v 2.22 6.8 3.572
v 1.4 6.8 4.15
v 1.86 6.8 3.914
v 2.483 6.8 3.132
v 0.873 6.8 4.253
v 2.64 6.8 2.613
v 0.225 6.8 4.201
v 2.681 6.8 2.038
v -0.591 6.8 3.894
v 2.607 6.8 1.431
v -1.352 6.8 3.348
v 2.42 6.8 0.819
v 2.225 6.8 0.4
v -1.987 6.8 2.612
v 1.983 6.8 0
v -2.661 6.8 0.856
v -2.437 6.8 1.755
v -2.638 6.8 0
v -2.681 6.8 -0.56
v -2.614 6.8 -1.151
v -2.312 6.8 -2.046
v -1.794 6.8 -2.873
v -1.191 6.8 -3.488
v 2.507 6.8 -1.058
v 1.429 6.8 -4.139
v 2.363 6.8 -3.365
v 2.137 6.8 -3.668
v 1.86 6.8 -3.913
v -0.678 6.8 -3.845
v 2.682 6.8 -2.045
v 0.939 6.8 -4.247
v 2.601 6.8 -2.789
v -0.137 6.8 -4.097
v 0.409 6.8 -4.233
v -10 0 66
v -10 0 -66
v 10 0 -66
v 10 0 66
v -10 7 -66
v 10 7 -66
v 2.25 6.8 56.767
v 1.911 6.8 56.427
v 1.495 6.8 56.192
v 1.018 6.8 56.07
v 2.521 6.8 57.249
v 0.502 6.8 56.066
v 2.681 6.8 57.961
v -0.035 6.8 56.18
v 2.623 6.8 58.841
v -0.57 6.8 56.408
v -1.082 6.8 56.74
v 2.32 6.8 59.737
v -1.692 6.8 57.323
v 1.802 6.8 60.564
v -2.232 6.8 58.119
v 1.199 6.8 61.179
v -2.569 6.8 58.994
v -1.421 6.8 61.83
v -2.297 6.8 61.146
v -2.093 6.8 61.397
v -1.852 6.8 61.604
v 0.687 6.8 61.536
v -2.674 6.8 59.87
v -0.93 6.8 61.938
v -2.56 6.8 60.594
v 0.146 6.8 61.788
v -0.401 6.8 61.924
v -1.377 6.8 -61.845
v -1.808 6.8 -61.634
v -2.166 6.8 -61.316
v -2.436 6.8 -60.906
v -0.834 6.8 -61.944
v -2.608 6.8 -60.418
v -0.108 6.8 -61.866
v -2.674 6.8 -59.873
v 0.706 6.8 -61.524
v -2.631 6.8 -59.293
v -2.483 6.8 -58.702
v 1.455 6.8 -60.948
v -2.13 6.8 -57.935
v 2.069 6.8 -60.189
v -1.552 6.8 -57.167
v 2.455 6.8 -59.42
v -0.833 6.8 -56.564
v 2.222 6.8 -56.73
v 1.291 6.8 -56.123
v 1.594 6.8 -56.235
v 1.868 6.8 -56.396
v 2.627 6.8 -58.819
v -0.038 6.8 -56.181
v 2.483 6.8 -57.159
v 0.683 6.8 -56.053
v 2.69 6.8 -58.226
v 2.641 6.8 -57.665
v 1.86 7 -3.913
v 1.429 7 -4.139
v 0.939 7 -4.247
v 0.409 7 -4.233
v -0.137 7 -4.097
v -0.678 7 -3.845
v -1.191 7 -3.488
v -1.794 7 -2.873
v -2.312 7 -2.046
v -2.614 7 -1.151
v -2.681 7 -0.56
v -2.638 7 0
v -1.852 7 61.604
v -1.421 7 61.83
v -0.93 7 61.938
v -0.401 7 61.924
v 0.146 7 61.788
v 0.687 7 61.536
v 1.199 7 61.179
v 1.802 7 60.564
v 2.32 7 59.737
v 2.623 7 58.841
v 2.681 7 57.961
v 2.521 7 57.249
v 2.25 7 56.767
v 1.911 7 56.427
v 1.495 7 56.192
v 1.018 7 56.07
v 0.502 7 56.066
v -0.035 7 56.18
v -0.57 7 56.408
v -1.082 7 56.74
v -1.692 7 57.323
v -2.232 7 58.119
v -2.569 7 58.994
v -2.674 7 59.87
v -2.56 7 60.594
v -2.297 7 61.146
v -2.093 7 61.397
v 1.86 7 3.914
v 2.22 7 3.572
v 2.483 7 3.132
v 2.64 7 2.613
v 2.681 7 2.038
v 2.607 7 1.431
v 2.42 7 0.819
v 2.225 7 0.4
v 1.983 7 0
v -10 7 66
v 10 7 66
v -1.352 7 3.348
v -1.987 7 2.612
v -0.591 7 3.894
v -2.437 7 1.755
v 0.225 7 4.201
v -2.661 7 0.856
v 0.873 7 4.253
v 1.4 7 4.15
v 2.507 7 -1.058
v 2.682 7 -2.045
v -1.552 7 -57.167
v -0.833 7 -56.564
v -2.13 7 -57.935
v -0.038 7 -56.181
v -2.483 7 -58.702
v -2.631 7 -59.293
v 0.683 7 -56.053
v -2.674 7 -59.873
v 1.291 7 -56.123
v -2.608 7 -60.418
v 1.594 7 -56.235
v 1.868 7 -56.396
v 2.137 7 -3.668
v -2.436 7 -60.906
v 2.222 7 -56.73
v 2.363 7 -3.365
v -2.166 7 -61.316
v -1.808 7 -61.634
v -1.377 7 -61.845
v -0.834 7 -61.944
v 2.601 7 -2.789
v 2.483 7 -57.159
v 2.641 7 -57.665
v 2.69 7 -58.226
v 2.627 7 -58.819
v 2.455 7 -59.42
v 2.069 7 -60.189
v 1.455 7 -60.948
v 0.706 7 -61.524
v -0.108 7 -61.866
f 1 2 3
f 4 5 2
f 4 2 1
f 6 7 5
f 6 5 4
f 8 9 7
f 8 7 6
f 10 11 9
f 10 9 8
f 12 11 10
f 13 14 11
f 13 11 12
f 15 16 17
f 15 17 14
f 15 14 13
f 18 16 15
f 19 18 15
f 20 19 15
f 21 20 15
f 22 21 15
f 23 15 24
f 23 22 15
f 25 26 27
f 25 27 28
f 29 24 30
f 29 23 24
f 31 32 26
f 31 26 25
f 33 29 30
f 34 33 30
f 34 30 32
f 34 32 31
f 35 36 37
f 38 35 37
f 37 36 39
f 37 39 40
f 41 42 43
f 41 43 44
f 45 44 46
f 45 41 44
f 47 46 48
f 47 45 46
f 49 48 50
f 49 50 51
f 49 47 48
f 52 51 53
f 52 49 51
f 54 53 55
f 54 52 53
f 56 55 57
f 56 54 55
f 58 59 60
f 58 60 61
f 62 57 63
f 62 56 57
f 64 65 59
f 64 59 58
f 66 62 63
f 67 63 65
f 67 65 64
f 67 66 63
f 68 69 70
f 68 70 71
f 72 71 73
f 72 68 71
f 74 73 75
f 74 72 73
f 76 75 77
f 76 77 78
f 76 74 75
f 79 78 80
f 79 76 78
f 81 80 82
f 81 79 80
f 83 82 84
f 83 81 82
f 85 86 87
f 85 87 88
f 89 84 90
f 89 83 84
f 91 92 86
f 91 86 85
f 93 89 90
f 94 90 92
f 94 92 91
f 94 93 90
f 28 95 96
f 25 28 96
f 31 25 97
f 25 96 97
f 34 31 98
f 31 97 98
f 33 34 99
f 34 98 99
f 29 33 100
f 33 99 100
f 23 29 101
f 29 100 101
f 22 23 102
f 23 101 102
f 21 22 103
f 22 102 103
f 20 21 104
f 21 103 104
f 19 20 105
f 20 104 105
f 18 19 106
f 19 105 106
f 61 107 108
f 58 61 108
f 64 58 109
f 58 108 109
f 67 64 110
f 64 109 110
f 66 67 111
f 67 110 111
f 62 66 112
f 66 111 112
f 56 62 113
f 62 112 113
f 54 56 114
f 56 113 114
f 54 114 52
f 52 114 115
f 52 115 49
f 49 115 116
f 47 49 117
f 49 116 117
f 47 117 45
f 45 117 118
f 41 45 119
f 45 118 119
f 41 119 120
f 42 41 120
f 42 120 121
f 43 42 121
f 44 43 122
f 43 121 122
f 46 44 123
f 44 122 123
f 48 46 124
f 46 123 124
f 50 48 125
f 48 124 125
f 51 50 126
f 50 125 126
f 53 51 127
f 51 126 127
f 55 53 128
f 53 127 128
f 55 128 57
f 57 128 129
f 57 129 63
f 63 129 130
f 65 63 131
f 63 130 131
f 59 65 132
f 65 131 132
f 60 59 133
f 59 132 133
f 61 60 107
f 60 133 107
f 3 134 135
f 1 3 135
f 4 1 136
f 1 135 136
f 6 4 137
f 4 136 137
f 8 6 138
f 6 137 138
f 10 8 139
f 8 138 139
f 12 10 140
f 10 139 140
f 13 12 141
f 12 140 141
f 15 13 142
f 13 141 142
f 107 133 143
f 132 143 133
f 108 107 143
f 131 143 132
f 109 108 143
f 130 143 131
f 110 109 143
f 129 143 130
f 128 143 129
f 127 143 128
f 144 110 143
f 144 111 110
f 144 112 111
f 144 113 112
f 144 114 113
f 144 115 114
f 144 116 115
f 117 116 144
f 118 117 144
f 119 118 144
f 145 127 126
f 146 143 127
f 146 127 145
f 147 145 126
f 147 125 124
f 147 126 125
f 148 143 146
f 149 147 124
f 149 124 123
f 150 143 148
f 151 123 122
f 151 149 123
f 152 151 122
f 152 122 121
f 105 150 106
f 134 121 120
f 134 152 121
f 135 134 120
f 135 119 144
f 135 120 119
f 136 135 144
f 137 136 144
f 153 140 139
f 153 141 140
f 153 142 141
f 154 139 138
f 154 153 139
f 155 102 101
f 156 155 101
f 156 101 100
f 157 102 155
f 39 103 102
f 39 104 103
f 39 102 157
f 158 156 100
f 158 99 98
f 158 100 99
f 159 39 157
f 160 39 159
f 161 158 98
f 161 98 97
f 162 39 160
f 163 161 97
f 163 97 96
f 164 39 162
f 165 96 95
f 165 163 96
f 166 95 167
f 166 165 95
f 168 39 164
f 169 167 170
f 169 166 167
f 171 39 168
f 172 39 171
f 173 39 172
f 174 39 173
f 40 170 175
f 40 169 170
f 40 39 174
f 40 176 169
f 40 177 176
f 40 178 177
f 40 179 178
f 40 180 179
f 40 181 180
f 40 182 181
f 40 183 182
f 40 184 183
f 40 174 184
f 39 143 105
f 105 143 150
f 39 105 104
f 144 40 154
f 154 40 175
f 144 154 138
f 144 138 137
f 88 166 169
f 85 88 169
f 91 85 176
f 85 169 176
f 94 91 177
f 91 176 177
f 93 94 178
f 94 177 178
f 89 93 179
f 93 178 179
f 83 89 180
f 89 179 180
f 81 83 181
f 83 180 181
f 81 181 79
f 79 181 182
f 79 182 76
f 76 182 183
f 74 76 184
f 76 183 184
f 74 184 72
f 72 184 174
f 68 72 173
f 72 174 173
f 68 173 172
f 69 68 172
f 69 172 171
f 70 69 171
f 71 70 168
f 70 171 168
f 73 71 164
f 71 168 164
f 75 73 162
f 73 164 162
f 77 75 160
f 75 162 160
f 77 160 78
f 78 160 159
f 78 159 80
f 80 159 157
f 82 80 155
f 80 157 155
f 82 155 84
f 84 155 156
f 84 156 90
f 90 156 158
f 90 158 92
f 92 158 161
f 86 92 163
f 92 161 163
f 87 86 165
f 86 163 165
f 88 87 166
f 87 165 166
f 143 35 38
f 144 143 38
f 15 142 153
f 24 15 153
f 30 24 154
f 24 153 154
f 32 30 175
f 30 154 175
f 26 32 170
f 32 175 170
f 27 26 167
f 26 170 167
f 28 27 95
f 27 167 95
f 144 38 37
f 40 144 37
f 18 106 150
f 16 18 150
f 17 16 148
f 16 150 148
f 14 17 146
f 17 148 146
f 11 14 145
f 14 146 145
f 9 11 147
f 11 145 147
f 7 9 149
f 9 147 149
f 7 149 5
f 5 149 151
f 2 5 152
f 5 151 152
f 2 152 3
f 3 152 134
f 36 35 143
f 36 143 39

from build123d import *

# Parameters (mm, degrees)
CROQUIS1_W              = 20
CROQUIS1_H              = 132
SALIENTE_EXTRUIR1_DEPTH = 7
CROQUIS2_RX             = 3.2
CROQUIS2_RY             = 2.375
CORTAR_EXTRUIR1_DEPTH   = 0.2


with BuildPart() as part:
    # Croquis1 → Saliente-Extruir1 (new body)
    with BuildSketch(Plane(origin=(0, 0, 0), x_dir=(1, 0, 0), z_dir=(0, 1, 0))):
        Rectangle(CROQUIS1_W, CROQUIS1_H)
    extrude(amount=SALIENTE_EXTRUIR1_DEPTH)

    # Croquis2 → Cortar-Extruir1 (cut)
    with BuildSketch(Plane(origin=(0, 7, 0), x_dir=(1, 0, 0), z_dir=(0, 1, 0))):
        with Locations(Location((0.008026014, -59), (0, 0, -125.538109025))):
            Ellipse(CROQUIS2_RX, CROQUIS2_RY)
        with Locations(Location((0.000308673, 1.309257057), (0, 0, 54.461890975))):
            Ellipse(CROQUIS2_RX, CROQUIS2_RY)
        with Locations(Location((0.000308673, -1.309627052), (0, 0, -54.461890975))):
            Ellipse(CROQUIS2_RX, CROQUIS2_RY)
        with Locations(Location((0.008026014, 58.999630006), (0, 0, -54.461890975))):
            Ellipse(CROQUIS2_RX, CROQUIS2_RY)
    extrude(amount=-CORTAR_EXTRUIR1_DEPTH, mode=Mode.SUBTRACT)


solid = part.part
